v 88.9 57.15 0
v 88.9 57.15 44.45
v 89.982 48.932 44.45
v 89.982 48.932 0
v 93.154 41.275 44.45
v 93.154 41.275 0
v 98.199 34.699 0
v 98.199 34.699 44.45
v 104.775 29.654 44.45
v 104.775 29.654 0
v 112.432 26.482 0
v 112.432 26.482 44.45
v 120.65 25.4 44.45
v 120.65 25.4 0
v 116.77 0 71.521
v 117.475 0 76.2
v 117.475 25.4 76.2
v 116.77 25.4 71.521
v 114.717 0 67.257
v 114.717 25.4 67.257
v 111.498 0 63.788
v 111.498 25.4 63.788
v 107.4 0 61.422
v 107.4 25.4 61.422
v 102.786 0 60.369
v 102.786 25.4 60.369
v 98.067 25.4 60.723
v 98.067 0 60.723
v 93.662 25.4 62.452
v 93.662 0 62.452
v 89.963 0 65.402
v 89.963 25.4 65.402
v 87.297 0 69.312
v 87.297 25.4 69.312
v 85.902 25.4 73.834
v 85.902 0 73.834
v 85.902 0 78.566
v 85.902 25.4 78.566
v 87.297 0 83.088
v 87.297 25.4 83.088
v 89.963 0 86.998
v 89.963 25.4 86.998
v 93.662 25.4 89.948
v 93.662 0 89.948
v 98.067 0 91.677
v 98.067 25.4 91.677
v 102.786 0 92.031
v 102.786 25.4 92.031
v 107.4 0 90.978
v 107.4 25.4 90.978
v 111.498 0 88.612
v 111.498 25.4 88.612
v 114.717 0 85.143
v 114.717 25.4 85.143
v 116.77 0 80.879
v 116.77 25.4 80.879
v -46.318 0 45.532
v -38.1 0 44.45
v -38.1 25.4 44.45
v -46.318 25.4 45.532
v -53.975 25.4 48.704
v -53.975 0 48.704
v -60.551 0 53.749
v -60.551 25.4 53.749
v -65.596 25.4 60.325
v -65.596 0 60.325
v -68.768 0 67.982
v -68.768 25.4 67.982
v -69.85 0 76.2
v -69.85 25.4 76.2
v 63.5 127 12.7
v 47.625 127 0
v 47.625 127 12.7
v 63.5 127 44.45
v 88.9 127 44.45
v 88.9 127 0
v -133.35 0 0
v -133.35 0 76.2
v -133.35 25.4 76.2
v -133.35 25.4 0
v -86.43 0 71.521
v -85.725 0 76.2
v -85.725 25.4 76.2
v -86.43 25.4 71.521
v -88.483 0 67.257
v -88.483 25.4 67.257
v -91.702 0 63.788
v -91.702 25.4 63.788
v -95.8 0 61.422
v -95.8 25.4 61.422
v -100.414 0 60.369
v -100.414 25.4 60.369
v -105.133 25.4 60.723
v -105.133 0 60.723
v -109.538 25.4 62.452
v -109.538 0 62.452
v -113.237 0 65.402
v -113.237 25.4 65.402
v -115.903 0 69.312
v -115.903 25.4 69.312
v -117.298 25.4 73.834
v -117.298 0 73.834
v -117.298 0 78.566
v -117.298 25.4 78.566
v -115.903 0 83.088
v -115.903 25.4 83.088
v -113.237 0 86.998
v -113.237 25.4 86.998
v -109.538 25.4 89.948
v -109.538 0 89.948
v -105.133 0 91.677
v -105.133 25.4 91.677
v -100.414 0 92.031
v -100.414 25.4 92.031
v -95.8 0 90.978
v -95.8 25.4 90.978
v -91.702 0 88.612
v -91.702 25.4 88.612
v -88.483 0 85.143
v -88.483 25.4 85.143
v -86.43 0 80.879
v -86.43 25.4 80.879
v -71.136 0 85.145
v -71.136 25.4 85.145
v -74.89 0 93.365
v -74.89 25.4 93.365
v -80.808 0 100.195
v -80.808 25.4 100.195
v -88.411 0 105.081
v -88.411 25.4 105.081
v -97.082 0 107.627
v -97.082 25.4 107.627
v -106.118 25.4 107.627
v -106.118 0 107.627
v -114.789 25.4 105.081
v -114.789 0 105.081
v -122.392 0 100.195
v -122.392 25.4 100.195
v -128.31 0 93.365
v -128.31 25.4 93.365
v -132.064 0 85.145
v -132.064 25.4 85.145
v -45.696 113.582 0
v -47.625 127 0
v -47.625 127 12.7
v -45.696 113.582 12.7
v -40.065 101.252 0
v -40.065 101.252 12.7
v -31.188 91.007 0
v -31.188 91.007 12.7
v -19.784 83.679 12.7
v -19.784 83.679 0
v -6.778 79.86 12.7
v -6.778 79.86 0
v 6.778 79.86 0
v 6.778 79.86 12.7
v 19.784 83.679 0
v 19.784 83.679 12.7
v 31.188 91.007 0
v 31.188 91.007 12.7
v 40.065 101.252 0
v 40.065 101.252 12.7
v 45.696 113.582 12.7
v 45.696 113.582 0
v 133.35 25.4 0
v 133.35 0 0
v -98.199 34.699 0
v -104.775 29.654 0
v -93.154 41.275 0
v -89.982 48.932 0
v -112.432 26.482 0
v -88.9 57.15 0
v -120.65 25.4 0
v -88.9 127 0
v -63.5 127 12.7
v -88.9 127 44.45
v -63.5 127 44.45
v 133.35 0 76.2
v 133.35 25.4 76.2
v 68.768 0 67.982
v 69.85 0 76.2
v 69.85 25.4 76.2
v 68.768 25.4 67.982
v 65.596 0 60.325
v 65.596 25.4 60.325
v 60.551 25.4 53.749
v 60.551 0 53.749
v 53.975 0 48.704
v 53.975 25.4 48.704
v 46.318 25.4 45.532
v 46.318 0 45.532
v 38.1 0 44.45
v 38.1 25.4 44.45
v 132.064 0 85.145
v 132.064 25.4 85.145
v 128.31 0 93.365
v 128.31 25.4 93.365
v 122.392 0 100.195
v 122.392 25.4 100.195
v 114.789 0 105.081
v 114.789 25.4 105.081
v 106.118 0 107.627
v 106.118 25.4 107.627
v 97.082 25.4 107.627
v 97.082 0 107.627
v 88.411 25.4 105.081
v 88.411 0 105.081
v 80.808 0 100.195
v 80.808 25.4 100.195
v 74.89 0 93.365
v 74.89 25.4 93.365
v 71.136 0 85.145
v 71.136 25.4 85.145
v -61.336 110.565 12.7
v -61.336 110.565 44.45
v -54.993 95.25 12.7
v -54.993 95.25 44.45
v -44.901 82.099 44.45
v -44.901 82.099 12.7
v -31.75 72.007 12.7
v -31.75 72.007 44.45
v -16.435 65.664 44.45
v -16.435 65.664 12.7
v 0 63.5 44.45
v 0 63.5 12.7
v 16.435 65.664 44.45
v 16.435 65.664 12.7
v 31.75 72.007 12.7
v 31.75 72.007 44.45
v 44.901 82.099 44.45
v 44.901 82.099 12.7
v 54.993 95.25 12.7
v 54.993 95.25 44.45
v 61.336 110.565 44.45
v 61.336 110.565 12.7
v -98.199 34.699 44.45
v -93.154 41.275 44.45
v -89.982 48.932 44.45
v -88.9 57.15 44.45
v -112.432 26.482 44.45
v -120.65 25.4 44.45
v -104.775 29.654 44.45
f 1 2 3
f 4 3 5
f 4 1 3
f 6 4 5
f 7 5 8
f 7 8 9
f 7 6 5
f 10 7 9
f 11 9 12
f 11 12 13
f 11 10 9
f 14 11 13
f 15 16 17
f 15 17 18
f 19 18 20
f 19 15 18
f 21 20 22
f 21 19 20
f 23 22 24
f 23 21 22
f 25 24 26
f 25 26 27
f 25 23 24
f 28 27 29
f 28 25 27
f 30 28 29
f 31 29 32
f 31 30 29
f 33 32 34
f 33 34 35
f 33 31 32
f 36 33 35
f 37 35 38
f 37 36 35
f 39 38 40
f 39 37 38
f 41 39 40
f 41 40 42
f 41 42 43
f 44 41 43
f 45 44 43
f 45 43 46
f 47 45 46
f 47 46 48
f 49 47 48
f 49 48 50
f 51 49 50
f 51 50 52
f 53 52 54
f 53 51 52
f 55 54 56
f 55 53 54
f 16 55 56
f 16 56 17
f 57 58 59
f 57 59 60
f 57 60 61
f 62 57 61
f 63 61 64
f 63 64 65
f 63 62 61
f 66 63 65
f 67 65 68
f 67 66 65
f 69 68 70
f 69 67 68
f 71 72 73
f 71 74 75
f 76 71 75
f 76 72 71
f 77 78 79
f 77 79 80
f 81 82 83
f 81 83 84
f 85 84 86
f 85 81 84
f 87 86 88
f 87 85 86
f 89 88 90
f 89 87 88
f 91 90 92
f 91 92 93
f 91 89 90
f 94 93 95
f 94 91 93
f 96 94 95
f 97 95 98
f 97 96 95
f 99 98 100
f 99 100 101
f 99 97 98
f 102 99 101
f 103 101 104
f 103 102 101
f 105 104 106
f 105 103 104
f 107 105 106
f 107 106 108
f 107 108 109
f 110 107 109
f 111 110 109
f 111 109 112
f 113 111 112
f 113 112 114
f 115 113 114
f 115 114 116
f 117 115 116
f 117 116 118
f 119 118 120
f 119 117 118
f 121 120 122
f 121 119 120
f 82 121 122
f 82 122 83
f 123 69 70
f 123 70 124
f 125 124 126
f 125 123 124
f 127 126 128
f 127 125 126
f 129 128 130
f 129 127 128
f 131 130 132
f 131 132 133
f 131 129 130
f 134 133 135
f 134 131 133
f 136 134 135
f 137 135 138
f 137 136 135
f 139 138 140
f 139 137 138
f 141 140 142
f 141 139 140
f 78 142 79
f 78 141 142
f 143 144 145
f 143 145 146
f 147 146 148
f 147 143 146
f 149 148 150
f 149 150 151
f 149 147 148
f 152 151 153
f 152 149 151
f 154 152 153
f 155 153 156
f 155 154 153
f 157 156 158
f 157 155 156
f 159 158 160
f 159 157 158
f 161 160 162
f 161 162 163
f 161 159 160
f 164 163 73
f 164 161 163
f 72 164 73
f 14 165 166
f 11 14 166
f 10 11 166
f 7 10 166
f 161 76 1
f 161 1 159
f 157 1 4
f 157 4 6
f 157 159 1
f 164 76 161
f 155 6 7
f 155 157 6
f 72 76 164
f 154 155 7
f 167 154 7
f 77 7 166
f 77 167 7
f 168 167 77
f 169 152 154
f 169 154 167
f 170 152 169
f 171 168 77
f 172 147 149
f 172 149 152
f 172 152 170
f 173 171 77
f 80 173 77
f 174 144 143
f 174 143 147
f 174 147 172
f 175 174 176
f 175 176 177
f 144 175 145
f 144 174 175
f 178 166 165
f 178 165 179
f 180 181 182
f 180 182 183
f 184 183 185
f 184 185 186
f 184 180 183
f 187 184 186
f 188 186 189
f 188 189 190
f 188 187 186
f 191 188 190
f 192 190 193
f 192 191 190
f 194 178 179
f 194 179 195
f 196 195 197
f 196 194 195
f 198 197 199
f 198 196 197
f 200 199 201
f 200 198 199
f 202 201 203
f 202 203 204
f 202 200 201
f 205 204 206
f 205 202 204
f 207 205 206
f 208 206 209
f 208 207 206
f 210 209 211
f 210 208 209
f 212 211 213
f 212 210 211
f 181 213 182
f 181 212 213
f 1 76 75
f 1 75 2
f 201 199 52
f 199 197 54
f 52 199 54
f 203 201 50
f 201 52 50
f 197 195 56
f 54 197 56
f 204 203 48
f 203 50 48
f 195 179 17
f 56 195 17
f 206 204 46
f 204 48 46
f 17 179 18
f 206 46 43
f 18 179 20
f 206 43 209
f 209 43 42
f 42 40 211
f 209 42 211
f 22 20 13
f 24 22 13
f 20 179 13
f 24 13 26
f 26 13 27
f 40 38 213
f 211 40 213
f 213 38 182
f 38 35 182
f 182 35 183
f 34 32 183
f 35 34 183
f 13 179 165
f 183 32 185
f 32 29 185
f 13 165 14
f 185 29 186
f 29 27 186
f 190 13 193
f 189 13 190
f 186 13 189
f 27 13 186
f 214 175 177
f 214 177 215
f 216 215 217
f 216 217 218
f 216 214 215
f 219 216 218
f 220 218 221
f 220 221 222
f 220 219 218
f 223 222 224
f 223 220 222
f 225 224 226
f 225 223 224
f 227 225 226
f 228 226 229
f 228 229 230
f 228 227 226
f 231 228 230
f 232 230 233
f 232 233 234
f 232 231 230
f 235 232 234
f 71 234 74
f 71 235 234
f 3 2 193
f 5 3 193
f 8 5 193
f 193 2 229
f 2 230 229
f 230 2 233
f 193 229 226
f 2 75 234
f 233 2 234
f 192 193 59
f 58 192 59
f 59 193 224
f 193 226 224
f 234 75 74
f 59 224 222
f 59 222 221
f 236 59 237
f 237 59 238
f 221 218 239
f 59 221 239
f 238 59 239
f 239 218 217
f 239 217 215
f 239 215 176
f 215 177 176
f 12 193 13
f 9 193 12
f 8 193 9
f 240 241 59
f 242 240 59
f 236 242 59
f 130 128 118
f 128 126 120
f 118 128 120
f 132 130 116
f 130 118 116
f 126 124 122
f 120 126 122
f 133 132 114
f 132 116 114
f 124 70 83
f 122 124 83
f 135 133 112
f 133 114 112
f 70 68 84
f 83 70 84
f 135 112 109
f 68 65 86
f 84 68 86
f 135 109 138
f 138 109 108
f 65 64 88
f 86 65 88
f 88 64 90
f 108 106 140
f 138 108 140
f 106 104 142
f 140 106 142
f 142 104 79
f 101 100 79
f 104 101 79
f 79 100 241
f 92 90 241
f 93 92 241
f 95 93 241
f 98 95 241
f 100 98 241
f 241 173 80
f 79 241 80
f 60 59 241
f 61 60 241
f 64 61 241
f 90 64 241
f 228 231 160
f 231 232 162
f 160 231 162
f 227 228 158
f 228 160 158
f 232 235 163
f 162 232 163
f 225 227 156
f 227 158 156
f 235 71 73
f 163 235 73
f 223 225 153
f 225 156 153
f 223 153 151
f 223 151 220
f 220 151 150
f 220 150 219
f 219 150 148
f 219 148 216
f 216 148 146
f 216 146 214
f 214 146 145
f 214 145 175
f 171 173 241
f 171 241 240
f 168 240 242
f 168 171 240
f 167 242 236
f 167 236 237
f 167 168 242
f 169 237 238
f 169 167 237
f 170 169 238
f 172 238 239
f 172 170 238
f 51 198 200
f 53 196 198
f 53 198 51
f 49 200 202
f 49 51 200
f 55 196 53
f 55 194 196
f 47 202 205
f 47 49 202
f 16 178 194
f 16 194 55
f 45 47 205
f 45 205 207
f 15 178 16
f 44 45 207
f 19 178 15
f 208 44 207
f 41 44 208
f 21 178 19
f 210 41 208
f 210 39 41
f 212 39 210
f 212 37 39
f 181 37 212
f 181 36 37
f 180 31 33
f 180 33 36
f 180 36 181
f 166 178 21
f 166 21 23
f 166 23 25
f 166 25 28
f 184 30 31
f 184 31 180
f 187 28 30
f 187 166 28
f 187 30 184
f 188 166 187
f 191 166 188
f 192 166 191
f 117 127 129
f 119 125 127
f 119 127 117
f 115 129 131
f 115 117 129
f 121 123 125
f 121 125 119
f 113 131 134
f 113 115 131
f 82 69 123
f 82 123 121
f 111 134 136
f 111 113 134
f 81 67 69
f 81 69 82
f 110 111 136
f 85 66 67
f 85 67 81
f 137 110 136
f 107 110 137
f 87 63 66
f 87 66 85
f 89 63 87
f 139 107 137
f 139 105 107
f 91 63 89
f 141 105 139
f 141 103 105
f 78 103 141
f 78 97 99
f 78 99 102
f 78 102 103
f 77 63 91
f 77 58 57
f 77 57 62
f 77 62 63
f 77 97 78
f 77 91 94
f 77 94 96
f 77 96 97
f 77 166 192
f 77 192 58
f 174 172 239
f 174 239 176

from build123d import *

# Parameters (mm, degrees)
SKETCH2_R           = 15.875
BOSS_EXTRUDE1_DEPTH = 25.4
BOSS_EXTRUDE2_DEPTH = 44.45
BOSS_EXTRUDE3_DEPTH = 12.7


with BuildPart() as part:
    # Sketch2 → Boss-Extrude1 (new body)
    with BuildSketch(Plane(origin=(0, 0, 0), x_dir=(1, 0, 0), z_dir=(0, 1, 0))):
        with BuildLine():
            Line((-133.35, 0), (133.35, 0))
            Line((133.35, 0), (133.35, -76.2))
            ThreePointArc((133.35, -76.2), (101.6, -107.95), (69.85, -76.2))
            ThreePointArc((69.85, -76.2), (60.550640303, -53.749359697), (38.1, -44.45))
            Line((38.1, -44.45), (-38.1, -44.45))
            ThreePointArc((-38.1, -44.45), (-60.550640303, -53.749359697), (-69.85, -76.2))
            ThreePointArc((-69.85, -76.2), (-101.6, -107.95), (-133.35, -76.2))
            Line((-133.35, -76.2), (-133.35, 0))
        make_face()
        with Locations((101.6, -76.2)):
            Circle(SKETCH2_R, mode=Mode.SUBTRACT)
        with Locations((-101.6, -76.2)):
            Circle(SKETCH2_R, mode=Mode.SUBTRACT)
    extrude(amount=BOSS_EXTRUDE1_DEPTH)

    # Sketch3 → Boss-Extrude2 (add)
    with BuildSketch(Plane(origin=(0, 0, 0), x_dir=(-1, 0, 0), z_dir=(0, 0, -1))):
        with BuildLine():
            ThreePointArc((63.5, 127), (0, 63.5), (-63.5, 127))
            Line((-63.5, 127), (-88.9, 127))
            Line((-88.9, 127), (-88.9, 57.15))
            ThreePointArc((-88.9, 57.15), (-98.199359697, 34.699359697), (-120.65, 25.4))
            Line((-120.65, 25.4), (0, 25.4))
            Line((0, 25.4), (120.65, 25.4))
            ThreePointArc((120.65, 25.4), (98.199359697, 34.699359697), (88.9, 57.15))
            Line((88.9, 57.15), (88.9, 127))
            Line((88.9, 127), (63.5, 127))
        make_face()
    extrude(amount=-BOSS_EXTRUDE2_DEPTH)

    # Sketch4 → Boss-Extrude3 (add)
    with BuildSketch(Plane(origin=(0, 0, 0), x_dir=(-1, 0, 0), z_dir=(0, 0, -1))):
        with BuildLine():
            Line((-47.625, 127), (-63.5, 127))
            ThreePointArc((-63.5, 127), (0, 63.5), (63.5, 127))
            Line((63.5, 127), (47.625, 127))
            ThreePointArc((47.625, 127), (0, 79.375), (-47.625, 127))
        make_face()
    extrude(amount=-BOSS_EXTRUDE3_DEPTH)


solid = part.part
